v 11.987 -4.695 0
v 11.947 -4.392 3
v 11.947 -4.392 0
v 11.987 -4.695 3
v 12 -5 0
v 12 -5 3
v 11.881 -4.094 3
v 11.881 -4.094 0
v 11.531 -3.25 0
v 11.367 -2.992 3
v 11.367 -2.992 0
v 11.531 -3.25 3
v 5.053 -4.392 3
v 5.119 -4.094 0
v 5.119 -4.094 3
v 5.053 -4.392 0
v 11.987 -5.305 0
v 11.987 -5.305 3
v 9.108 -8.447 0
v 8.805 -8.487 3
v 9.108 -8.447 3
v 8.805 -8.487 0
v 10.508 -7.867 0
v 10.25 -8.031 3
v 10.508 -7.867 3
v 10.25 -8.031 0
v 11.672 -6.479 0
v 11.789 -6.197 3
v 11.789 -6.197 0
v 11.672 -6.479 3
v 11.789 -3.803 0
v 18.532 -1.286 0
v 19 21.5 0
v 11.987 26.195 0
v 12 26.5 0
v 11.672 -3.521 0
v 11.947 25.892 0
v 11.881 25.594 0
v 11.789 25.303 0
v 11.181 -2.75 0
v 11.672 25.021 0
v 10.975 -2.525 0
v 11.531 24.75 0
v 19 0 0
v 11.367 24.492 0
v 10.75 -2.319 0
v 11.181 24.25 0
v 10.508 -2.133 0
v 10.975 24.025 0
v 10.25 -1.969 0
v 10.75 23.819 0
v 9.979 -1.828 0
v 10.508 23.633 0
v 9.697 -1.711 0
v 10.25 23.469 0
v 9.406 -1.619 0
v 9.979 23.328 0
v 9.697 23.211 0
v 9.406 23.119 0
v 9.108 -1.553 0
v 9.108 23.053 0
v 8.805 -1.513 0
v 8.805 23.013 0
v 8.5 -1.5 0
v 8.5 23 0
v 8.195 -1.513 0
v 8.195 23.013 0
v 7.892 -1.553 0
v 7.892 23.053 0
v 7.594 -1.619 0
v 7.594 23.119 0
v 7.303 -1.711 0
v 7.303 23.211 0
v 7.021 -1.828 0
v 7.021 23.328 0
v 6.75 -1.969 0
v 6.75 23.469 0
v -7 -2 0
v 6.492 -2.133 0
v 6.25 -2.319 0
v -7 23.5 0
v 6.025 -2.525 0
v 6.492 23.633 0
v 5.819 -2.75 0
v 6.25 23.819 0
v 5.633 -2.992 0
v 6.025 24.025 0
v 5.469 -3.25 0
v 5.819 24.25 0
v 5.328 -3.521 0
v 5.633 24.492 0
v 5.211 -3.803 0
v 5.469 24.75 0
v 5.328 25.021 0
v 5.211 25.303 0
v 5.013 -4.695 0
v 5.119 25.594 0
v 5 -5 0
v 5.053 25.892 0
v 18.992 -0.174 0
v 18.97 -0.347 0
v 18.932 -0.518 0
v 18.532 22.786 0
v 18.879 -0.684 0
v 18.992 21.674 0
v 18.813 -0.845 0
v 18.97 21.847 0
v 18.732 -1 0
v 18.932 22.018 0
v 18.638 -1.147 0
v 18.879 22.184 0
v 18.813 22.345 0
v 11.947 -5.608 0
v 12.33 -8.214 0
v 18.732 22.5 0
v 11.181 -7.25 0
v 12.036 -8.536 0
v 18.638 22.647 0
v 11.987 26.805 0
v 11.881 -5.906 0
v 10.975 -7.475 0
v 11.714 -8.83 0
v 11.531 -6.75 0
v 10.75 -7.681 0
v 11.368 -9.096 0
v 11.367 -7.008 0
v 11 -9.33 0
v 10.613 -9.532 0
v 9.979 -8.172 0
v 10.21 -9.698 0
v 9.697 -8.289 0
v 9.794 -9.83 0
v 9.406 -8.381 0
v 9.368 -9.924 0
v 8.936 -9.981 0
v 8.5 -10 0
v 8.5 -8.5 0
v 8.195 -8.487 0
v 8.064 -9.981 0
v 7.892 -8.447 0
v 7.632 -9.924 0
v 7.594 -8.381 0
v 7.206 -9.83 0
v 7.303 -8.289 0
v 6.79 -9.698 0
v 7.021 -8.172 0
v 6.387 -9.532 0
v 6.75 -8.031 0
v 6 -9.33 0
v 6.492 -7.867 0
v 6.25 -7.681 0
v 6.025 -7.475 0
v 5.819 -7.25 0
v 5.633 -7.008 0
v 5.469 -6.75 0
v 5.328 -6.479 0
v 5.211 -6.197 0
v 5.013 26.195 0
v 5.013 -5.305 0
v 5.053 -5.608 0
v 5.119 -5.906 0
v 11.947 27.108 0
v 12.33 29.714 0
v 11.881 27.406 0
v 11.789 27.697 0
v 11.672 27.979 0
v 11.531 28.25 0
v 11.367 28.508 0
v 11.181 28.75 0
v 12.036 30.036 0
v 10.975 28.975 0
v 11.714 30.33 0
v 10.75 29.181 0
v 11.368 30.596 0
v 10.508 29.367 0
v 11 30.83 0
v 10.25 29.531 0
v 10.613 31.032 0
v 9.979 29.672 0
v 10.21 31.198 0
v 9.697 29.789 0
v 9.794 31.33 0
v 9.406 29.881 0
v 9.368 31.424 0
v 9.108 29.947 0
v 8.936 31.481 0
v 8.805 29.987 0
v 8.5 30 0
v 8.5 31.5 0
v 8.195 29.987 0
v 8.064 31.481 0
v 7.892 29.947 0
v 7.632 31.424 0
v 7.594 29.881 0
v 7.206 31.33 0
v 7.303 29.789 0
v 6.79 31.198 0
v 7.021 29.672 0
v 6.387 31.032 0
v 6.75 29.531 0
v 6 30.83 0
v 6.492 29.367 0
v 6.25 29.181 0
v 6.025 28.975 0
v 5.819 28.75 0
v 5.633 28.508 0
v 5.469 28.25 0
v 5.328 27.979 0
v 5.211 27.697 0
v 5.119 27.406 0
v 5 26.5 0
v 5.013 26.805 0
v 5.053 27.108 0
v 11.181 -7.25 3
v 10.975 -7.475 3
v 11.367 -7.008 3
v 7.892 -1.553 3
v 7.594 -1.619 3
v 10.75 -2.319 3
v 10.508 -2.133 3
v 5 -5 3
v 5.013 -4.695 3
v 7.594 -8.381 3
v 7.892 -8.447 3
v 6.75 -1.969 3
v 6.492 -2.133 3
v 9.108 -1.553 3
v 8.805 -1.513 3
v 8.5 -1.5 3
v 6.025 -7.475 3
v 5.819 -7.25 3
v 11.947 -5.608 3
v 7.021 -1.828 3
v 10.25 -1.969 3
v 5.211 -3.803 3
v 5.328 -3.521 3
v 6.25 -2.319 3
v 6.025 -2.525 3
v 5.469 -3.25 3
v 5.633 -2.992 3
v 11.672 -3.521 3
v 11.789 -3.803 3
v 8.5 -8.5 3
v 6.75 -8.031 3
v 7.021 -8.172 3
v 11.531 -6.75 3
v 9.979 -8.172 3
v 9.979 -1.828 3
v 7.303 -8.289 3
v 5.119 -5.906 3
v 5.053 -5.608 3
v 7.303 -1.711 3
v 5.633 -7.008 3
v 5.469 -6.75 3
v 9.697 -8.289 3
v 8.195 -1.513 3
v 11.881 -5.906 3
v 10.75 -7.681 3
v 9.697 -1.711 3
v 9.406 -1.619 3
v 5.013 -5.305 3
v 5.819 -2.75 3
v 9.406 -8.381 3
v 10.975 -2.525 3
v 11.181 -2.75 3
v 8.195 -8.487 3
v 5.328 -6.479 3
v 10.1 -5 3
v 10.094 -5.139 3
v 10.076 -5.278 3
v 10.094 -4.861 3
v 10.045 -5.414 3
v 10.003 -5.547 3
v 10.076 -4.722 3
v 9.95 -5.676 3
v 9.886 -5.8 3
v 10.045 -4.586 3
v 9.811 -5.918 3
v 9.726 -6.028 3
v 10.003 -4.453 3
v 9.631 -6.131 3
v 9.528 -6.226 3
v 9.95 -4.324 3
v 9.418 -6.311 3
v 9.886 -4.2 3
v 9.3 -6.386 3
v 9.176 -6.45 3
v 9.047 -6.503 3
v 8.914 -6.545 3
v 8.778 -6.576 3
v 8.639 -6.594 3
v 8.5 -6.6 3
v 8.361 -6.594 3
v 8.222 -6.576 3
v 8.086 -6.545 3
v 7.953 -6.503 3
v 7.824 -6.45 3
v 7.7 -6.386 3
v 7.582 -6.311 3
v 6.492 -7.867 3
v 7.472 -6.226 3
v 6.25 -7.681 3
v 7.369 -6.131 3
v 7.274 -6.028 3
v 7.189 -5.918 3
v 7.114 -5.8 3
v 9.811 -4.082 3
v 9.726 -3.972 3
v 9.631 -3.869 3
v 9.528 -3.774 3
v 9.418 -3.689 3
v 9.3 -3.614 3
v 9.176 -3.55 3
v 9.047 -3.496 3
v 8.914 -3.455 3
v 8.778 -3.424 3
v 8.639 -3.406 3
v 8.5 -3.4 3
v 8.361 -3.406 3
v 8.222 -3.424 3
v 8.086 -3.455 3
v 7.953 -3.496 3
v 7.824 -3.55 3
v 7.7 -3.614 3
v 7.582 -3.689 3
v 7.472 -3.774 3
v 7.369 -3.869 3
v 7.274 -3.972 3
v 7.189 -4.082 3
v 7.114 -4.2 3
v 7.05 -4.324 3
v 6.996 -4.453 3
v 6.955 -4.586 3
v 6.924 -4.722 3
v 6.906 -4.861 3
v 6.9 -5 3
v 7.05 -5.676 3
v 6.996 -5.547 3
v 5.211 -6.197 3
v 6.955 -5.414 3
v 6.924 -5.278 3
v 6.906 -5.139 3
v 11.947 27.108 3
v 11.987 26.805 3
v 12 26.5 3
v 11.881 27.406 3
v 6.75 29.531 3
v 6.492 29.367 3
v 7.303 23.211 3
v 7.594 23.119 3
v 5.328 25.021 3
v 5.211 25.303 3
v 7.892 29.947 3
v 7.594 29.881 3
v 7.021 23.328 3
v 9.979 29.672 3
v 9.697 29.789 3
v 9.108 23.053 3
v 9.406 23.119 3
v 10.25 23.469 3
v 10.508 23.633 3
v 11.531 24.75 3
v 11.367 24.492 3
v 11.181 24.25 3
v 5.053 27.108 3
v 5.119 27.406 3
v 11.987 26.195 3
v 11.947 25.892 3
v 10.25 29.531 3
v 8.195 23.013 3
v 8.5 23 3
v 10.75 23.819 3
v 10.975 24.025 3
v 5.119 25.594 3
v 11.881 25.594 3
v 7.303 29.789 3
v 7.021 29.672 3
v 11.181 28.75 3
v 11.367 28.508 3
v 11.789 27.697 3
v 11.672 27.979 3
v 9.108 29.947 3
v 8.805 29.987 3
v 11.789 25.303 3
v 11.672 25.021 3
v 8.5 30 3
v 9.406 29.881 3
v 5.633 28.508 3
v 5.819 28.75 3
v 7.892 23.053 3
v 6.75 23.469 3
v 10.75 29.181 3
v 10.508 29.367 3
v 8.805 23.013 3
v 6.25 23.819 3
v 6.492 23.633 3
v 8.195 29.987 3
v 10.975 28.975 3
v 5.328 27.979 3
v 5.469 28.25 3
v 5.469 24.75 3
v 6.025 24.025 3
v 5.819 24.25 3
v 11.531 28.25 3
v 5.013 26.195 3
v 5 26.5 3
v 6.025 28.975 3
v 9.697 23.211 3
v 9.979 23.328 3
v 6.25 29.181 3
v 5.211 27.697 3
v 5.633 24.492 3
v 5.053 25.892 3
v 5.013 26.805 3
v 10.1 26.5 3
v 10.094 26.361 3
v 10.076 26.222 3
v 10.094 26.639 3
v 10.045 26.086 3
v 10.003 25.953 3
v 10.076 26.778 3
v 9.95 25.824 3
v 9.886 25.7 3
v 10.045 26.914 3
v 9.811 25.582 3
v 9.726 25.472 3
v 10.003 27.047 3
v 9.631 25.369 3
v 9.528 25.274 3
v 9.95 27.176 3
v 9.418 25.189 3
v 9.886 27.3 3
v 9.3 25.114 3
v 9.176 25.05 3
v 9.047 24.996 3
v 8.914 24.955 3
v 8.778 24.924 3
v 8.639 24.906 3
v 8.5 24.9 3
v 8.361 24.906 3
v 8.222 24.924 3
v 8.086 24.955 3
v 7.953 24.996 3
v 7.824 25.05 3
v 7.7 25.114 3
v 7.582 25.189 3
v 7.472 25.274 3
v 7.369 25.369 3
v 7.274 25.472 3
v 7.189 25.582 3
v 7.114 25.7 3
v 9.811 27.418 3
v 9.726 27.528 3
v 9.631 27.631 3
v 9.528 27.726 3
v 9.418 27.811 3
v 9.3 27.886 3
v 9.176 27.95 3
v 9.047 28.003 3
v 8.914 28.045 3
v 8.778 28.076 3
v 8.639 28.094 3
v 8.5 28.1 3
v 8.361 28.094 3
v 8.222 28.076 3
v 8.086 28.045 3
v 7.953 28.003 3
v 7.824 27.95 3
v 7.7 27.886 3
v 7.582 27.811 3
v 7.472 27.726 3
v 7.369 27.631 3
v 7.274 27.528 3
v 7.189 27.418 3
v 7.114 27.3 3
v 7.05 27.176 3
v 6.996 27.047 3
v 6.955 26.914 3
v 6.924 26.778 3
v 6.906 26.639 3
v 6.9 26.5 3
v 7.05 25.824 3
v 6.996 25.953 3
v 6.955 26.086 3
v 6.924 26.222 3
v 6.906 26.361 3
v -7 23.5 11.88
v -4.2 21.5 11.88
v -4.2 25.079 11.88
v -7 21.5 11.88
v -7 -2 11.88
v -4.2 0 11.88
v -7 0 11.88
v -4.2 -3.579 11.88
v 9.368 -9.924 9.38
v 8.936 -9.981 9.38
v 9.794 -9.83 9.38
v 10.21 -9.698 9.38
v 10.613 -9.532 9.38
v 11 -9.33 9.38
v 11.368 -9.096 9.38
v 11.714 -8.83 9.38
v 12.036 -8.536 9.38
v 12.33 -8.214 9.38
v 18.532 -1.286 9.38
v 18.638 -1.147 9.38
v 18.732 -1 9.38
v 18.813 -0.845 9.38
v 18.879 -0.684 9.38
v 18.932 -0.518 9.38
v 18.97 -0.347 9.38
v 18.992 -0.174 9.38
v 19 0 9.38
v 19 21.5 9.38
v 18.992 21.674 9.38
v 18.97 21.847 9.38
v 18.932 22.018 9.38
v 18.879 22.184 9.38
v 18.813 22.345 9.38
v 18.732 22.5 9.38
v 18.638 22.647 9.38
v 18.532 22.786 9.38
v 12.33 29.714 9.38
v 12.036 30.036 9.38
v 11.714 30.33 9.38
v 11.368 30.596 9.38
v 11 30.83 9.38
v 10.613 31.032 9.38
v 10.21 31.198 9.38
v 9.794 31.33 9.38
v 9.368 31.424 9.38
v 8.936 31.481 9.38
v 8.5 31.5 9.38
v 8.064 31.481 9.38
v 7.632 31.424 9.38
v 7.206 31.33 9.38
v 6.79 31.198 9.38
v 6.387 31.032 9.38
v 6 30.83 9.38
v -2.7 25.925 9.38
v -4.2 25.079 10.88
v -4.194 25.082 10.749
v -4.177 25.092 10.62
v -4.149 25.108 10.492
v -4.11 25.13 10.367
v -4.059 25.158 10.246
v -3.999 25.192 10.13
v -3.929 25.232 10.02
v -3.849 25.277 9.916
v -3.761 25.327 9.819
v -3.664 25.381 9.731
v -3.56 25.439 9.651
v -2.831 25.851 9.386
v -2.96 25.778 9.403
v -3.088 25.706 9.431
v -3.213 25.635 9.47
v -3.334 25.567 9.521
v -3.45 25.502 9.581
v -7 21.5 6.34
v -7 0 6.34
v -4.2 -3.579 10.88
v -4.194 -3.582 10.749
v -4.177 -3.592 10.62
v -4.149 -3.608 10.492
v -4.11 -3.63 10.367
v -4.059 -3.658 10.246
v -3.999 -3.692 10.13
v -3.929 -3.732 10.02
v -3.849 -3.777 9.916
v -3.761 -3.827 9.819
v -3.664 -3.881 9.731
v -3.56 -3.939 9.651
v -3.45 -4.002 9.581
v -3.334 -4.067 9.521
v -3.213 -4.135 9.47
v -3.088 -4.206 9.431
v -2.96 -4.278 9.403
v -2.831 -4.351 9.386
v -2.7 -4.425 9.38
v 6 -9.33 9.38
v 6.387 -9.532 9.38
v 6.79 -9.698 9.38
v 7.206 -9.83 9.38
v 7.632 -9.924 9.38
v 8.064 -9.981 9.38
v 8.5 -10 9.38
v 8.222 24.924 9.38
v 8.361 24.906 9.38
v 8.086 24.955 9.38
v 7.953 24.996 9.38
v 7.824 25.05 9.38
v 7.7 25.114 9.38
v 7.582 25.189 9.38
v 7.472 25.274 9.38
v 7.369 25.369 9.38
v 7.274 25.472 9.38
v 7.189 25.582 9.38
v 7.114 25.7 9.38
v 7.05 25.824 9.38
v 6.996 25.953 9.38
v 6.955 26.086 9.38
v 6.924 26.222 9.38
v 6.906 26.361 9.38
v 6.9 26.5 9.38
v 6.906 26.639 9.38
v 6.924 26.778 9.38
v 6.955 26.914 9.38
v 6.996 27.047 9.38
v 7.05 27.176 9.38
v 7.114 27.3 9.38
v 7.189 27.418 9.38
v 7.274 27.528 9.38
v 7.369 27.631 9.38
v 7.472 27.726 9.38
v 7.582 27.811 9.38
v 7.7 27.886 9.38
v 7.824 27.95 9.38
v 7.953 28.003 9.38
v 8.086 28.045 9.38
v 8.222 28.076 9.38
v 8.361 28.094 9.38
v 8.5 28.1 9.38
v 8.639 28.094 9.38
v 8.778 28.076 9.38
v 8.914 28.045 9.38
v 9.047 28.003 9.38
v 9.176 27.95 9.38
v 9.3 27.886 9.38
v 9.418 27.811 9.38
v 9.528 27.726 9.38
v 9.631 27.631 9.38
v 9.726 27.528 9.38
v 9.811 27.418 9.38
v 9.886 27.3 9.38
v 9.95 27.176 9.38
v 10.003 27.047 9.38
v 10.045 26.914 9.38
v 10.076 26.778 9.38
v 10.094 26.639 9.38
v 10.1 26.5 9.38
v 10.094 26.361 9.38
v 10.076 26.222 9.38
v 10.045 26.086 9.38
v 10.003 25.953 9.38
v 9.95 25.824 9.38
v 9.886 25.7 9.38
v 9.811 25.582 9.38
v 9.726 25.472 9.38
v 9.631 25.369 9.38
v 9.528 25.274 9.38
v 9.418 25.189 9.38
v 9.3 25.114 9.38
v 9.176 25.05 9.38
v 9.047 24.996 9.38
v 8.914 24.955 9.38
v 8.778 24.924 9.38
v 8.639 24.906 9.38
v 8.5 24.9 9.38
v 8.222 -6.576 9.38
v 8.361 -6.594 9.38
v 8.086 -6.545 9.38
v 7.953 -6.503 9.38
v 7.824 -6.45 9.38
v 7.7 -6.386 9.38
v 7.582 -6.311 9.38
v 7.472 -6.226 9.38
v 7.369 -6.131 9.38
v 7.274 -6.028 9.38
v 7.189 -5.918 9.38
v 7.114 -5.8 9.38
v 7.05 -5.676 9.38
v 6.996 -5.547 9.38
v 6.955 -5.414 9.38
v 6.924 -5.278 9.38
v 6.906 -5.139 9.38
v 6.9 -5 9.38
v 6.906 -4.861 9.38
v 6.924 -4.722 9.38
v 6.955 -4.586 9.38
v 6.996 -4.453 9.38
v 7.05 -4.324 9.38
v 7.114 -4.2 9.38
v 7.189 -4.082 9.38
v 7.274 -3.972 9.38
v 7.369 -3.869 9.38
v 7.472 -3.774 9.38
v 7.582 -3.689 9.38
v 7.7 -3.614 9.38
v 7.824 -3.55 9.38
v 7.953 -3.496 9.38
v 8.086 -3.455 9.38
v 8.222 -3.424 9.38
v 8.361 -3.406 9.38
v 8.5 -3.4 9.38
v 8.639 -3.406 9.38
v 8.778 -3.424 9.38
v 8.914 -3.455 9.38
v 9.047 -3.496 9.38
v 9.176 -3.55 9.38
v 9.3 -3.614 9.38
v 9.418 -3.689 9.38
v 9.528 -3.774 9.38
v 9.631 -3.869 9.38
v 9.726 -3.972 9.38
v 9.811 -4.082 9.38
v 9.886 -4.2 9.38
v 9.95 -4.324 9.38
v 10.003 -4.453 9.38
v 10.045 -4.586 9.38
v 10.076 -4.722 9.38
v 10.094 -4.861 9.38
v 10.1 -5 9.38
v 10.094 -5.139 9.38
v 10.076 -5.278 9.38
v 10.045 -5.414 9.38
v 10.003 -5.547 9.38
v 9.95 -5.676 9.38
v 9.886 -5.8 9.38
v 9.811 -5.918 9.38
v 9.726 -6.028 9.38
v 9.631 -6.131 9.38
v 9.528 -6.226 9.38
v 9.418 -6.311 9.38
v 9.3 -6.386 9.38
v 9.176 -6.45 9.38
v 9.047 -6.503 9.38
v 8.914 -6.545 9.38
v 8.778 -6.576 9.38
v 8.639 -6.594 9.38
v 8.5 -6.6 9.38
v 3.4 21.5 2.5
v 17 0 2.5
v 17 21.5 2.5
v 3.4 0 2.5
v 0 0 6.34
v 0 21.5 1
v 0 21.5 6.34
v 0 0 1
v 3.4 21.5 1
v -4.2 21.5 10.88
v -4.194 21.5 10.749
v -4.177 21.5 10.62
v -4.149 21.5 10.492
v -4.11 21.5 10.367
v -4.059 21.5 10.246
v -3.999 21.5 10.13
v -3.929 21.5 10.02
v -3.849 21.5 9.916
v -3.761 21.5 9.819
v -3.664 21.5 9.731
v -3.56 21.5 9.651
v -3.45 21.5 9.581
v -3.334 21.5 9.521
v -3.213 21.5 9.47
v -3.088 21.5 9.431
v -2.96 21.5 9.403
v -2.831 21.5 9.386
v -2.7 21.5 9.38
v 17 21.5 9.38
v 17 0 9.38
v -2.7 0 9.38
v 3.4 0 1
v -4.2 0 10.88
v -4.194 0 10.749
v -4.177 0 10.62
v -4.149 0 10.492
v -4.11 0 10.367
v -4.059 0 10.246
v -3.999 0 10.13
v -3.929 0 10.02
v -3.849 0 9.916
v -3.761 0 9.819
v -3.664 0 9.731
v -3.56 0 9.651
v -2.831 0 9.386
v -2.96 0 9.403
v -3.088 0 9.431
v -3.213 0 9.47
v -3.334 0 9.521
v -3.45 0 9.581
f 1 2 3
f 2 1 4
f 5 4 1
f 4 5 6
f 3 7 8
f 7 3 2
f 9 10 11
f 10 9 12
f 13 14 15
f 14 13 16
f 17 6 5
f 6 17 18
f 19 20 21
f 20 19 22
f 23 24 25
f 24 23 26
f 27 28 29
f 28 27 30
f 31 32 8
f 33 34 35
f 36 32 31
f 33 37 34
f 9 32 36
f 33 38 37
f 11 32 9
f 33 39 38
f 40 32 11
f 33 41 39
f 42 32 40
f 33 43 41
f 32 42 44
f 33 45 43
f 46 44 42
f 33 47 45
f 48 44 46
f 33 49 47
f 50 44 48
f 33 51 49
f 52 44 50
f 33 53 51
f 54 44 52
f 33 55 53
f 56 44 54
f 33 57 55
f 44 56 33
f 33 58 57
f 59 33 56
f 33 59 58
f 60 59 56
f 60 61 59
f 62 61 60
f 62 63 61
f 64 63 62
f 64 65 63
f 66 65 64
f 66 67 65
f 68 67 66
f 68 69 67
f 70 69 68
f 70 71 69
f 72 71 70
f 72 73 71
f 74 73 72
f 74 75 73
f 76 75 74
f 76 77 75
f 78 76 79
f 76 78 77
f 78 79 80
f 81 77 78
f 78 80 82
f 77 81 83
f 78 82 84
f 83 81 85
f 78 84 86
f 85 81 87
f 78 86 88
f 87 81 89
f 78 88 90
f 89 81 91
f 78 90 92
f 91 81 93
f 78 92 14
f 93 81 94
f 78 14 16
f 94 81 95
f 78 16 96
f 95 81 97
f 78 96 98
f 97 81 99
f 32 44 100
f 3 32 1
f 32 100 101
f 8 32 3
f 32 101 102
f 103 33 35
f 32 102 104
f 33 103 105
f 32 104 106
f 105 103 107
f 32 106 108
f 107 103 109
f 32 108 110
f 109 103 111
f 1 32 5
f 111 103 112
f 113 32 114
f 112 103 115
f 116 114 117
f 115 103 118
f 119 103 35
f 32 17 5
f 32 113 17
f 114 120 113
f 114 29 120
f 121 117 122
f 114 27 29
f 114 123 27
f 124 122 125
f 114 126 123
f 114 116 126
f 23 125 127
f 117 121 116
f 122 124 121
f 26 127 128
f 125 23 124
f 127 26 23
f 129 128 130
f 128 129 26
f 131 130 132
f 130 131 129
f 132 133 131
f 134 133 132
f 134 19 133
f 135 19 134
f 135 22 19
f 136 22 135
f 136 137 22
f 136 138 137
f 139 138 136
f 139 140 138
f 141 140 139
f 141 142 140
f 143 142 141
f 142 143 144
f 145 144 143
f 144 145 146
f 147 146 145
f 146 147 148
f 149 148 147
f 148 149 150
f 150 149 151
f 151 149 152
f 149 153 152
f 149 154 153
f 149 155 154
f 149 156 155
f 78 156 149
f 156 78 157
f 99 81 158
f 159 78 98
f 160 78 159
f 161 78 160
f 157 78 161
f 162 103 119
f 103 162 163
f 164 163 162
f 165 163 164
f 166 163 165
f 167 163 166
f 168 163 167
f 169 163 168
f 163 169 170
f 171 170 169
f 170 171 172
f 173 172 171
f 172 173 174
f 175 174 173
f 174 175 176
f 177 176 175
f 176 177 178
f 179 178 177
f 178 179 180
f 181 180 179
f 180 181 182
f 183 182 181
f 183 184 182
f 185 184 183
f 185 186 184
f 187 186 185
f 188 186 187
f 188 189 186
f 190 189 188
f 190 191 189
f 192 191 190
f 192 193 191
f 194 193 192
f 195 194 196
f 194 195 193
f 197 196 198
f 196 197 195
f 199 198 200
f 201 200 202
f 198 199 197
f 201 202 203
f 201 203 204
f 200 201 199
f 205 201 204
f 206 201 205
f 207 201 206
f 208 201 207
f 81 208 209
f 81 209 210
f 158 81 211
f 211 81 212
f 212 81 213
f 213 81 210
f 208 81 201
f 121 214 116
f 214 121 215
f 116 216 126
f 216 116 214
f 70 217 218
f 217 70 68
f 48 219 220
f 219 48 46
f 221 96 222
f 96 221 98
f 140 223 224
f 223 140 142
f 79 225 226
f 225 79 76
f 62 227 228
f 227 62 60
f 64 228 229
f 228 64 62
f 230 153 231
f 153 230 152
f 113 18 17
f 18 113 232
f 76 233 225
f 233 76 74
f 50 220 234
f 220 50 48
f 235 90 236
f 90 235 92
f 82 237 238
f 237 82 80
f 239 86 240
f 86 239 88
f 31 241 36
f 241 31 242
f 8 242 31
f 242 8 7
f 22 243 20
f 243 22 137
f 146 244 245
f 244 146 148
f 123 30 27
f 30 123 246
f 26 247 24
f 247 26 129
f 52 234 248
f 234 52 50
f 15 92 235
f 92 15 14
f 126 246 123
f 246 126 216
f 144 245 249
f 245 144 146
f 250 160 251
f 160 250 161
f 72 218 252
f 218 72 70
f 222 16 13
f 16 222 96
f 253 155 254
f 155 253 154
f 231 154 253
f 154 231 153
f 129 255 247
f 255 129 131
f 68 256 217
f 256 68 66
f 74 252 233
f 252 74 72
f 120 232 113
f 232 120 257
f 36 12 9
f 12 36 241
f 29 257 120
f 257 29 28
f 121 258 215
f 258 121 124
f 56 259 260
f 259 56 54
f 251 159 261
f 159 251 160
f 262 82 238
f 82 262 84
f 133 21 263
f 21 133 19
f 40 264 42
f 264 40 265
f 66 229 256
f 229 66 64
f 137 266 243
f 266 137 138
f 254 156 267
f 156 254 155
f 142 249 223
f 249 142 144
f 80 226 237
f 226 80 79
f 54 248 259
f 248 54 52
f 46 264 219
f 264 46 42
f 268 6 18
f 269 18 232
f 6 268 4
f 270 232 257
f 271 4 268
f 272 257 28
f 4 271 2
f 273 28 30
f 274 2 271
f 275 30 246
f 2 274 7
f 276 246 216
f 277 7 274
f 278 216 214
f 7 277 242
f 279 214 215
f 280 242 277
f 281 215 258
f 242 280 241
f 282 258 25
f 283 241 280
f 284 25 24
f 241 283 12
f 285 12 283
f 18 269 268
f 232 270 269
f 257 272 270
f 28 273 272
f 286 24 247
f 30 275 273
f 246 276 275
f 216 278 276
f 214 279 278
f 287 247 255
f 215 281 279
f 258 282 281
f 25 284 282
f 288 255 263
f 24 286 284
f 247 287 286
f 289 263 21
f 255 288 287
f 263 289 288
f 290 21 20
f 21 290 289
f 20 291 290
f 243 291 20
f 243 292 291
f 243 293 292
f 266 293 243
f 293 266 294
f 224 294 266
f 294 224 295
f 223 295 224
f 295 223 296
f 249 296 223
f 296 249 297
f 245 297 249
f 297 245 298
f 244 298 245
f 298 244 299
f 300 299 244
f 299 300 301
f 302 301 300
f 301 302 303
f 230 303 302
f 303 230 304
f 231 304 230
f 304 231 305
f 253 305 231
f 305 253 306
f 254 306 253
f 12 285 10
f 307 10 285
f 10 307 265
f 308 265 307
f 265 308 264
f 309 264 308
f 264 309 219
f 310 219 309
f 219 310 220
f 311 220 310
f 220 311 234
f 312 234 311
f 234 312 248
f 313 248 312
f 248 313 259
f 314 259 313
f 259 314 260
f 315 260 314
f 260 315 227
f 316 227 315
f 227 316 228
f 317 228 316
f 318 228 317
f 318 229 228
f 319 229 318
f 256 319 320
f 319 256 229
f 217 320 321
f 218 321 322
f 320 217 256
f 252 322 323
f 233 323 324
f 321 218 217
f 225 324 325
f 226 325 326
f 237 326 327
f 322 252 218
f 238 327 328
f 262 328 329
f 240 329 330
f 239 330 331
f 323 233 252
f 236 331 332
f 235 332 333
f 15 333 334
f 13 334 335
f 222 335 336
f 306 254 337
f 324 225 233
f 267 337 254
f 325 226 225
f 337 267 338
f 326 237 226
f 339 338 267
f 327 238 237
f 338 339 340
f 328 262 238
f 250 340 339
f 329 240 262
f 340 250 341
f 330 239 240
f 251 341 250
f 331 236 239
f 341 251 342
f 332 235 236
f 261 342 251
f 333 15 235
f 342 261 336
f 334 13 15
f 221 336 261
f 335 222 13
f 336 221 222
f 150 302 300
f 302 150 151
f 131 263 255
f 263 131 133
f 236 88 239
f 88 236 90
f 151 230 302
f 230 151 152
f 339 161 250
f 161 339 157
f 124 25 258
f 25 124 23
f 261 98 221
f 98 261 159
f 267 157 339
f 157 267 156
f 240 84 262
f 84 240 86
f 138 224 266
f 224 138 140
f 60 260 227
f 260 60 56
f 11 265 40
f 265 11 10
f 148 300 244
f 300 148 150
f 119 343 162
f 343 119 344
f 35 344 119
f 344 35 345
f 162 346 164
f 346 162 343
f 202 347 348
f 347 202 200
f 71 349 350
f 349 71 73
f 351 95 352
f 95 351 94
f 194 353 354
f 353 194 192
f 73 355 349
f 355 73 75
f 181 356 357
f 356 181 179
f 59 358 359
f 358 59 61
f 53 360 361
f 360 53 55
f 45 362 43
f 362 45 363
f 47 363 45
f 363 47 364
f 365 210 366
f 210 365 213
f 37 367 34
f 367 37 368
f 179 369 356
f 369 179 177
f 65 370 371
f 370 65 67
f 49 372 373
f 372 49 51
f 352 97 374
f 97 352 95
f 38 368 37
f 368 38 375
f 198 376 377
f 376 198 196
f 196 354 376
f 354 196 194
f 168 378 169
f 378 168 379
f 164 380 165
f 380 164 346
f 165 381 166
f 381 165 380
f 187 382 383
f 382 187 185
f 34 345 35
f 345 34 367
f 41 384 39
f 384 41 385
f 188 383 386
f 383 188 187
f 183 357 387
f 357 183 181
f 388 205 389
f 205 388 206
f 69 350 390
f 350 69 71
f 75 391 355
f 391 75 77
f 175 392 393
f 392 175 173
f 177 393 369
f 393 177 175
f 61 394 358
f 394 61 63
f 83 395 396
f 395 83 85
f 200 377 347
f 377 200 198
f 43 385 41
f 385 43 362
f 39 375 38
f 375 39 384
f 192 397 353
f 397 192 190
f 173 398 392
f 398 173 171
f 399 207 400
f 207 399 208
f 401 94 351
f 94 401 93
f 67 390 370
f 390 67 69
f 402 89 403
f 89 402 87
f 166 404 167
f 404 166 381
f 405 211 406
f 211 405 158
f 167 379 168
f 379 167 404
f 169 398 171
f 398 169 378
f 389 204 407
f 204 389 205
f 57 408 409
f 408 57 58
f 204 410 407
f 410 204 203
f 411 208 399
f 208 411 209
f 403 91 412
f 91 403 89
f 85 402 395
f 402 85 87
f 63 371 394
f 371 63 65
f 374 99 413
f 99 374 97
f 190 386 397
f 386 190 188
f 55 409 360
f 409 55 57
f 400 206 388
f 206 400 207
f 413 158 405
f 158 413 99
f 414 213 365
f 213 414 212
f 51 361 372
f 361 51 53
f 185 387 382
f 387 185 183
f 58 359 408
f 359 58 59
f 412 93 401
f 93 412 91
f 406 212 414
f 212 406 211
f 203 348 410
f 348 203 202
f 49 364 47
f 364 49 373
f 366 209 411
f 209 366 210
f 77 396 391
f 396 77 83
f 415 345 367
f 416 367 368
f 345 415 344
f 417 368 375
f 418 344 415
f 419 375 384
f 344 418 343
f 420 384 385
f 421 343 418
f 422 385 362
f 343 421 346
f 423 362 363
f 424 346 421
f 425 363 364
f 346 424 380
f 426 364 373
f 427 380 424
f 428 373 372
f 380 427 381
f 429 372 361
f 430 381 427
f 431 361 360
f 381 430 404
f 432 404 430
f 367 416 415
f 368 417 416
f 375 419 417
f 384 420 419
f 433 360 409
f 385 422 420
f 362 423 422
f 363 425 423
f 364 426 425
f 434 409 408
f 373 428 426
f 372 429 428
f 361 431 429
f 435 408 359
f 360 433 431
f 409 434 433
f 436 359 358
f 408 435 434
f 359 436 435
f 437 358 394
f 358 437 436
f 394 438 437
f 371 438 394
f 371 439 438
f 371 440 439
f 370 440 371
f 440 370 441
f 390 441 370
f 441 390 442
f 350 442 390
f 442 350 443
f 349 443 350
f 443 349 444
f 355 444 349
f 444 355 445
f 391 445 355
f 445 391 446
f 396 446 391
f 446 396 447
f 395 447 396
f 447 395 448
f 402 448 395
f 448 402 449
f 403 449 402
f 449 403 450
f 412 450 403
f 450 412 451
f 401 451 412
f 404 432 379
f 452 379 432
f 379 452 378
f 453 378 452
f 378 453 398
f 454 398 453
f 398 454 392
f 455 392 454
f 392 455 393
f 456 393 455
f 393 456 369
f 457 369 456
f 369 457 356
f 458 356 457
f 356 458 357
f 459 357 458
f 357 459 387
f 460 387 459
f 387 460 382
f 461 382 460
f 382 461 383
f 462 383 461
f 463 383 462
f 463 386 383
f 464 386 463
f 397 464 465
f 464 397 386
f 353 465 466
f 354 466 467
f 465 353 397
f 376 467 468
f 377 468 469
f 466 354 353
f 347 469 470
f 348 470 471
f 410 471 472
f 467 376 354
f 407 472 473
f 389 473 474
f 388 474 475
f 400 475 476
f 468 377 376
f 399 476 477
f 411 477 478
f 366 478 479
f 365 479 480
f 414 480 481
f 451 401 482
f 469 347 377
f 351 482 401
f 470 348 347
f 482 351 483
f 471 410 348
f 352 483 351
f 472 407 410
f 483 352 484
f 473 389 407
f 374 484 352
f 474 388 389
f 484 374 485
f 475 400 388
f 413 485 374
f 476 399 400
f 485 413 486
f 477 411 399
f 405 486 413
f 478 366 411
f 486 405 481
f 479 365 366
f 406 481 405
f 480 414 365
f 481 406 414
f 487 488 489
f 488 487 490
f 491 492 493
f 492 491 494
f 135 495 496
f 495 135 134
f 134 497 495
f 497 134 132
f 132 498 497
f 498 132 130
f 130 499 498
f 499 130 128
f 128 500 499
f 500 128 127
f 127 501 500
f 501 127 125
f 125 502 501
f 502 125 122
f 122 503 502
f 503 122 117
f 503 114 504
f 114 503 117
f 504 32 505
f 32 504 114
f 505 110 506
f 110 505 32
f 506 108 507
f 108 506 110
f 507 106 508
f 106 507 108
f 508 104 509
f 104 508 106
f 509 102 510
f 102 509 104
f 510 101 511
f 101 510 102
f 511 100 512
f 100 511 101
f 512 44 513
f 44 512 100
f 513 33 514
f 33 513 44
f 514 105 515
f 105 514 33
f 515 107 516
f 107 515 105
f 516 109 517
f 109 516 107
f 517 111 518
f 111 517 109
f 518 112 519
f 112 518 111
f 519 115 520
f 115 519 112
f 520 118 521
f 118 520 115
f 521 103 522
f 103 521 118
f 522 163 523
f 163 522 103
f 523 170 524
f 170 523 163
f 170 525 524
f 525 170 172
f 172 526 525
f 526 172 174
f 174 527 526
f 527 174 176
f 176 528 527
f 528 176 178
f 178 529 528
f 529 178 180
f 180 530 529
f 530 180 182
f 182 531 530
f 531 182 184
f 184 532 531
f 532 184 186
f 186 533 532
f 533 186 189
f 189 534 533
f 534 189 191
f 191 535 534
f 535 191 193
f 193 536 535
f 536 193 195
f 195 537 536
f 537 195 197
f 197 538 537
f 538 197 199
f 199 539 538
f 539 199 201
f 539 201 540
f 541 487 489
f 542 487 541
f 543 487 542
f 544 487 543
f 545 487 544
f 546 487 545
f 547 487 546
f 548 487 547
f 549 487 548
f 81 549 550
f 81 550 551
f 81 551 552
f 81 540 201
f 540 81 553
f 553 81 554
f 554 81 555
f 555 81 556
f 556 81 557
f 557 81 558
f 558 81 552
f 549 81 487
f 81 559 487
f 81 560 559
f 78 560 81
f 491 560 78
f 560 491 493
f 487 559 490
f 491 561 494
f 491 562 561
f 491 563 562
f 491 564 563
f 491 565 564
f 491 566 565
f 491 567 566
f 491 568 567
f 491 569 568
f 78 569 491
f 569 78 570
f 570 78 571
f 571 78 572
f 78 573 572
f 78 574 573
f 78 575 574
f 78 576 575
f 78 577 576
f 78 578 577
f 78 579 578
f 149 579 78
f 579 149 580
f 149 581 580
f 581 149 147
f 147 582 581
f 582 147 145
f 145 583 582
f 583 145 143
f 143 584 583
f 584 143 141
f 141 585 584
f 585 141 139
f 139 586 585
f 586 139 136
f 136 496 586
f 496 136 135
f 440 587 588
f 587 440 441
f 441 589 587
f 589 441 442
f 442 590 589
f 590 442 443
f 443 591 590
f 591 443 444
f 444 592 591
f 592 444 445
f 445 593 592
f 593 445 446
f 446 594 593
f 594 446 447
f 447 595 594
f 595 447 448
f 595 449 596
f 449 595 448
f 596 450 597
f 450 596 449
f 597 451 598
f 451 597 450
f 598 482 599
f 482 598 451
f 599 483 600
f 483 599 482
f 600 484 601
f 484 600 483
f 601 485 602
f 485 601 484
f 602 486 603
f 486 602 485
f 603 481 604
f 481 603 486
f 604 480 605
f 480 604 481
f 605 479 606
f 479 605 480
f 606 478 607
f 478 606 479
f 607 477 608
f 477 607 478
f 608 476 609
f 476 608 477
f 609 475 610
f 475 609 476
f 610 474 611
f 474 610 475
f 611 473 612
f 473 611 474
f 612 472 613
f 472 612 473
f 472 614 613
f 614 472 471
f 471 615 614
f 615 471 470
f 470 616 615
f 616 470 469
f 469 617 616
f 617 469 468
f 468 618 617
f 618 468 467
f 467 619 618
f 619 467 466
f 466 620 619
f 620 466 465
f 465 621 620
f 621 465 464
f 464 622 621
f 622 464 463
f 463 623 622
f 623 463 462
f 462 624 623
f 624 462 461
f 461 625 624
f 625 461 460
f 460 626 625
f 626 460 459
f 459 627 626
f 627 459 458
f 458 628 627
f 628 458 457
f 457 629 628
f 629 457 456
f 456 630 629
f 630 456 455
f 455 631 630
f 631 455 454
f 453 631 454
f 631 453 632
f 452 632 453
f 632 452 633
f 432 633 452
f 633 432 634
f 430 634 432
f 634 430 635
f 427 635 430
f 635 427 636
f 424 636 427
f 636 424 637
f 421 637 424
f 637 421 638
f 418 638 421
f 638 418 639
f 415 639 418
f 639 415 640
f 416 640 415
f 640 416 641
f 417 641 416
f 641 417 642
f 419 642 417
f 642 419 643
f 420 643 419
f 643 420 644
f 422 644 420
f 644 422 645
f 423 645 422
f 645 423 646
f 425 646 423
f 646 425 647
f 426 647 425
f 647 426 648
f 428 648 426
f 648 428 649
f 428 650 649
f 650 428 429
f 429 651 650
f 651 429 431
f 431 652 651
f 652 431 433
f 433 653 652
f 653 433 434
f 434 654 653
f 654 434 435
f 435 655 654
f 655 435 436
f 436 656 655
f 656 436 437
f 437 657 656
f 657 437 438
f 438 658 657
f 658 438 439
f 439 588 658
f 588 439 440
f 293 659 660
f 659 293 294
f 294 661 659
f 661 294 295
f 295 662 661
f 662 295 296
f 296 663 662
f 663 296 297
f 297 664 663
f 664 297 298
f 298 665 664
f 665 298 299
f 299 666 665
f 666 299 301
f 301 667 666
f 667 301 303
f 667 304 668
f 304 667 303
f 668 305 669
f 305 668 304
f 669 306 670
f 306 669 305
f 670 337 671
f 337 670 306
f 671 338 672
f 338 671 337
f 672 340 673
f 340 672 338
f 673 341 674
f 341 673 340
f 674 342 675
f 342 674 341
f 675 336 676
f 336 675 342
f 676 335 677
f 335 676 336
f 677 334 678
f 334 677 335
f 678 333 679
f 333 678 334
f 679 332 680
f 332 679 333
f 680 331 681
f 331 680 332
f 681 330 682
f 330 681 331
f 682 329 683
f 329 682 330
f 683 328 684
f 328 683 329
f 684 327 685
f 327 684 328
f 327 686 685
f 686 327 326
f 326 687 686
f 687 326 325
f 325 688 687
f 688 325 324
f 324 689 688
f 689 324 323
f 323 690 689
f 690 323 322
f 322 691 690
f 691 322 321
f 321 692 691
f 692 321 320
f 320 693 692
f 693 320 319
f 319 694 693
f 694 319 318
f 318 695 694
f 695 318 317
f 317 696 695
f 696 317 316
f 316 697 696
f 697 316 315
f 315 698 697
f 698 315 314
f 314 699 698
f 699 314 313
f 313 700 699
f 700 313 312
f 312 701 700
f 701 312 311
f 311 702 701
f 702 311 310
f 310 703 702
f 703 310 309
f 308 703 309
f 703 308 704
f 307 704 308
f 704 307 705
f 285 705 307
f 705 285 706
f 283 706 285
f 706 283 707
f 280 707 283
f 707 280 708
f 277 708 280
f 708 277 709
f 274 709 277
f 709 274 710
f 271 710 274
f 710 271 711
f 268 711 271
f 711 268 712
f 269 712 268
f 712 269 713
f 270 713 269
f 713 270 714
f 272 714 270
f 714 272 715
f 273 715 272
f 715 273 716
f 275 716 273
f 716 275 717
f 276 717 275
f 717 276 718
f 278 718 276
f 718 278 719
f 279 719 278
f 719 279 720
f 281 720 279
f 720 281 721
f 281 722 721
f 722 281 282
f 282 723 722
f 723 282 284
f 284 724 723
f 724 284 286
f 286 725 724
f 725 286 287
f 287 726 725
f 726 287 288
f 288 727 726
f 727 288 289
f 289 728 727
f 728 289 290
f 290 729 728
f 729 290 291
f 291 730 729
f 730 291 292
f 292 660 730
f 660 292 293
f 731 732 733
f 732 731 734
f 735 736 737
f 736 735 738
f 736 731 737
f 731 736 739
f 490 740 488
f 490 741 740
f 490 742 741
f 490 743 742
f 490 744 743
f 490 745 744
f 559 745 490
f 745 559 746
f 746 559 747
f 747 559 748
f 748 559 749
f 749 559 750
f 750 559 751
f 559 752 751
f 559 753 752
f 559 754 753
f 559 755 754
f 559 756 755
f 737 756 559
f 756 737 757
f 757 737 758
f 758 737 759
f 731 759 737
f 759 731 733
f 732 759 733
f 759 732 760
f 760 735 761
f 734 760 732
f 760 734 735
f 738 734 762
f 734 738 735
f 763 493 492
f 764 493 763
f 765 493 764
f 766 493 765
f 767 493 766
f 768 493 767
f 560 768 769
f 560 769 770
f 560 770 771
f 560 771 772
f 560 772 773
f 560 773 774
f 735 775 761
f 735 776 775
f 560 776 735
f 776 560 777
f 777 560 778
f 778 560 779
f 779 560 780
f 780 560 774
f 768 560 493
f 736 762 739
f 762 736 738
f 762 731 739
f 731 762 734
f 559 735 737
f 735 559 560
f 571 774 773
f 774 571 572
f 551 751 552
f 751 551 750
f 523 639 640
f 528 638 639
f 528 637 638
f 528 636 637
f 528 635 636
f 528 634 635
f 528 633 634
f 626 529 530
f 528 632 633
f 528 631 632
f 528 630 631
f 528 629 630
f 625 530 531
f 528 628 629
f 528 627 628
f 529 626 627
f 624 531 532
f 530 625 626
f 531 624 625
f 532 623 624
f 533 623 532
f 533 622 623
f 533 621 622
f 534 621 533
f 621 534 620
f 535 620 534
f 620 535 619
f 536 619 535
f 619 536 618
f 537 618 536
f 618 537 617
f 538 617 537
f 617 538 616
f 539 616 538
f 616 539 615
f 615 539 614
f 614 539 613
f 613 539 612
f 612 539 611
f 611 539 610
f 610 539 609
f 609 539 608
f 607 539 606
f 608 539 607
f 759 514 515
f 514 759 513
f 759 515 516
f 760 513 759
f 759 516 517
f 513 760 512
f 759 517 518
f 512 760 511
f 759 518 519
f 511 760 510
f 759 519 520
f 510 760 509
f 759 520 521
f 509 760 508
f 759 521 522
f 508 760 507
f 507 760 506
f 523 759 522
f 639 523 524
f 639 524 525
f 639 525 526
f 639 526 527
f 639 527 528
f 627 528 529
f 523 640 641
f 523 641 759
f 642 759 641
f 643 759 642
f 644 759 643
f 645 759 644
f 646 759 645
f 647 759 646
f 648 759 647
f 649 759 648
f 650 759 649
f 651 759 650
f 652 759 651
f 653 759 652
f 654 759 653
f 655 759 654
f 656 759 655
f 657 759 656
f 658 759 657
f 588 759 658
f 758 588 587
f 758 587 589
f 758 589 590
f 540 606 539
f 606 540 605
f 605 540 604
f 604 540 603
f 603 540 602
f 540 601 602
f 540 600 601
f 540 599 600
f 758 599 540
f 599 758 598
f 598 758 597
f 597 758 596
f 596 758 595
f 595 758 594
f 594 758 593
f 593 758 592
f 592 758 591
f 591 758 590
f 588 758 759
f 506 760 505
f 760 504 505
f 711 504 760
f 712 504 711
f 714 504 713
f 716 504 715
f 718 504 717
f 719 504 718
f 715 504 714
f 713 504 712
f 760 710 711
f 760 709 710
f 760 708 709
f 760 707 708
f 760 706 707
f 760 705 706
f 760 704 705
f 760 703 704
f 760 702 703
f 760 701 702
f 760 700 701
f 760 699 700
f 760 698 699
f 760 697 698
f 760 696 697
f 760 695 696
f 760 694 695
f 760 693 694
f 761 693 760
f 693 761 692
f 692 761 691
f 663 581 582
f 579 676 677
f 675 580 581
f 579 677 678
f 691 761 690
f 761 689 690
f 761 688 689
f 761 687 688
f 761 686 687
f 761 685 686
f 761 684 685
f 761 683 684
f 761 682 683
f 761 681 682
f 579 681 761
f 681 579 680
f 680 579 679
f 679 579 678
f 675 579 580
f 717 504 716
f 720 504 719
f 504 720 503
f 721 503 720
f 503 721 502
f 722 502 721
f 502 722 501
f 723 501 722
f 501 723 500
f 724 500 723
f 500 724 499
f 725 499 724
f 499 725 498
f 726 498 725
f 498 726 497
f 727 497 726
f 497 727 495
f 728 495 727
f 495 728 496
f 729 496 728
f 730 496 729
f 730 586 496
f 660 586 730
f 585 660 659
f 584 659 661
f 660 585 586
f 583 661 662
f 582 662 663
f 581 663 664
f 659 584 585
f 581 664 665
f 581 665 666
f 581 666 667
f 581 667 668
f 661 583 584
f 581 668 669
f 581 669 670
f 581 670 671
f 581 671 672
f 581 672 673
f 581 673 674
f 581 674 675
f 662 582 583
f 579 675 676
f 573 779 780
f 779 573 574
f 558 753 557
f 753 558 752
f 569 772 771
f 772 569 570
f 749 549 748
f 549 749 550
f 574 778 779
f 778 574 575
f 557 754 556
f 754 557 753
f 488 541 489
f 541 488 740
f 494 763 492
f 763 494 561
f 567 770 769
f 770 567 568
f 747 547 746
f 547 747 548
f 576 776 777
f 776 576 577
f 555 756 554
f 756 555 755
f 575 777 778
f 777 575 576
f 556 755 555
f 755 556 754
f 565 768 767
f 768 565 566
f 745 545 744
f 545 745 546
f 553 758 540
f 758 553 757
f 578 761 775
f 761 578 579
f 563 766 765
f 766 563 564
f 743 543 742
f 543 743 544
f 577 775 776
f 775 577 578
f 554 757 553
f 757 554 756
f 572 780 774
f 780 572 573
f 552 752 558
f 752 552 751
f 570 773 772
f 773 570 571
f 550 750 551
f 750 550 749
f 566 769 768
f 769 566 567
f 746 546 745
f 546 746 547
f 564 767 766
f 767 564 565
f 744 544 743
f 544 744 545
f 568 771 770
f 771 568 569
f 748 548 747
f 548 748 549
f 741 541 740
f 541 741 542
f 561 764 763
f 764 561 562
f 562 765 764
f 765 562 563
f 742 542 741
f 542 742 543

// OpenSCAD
/*
MPU-6050 / 9150 IMU mounting bracket.

M3 mounting screws go beside the board

Holds a female 0.1" pin header in place.


Board dimensions:
20.9mm long
15.9mm wide
1.5mm thick
15.3mm hole to hole
3.05mm hole dia

L pins: 
2.6mm wide
2.5mm high
9mm long
*/

$fs=0.1; $fa=5;
inch=25.4;
wiggle=0.25; // printed clearance around printed parts, so parts actually fit
pinspacing=0.1*inch;
wall=2.0;
floor=2.5;
board_thick=1.3+0.1*inch; // board and first layer of headers
solder_thick=1.5;
pin_thick=0.1*inch+0.5;
overall=floor+pin_thick+board_thick+floor;

board_height=21.5;
board_width=17;

tube_OD=25.4;
module tube2D() {
    round=1.5;
    offset(r=+round) offset(r=-round)
        square([tube_OD,tube_OD]);
}
module tube3D() {
    translate([board_width/2-tube_OD/2,100,floor+pin_thick+board_thick])
        rotate([90,0,0])
            linear_extrude(height=200) tube2D();
}
//#tube3D();


module mpu_board2D() {
    square([board_width,board_height]);
}

module mpu_pins2D() {
    translate([4,0])
        scale([-1,1])
            square([11,board_height]);
}

module mpu_holes2D() {
    hole=5;
    for (y=[-hole,board_height+hole])
        translate([board_width/2,y])
            children();
}

module mpu_case2D() {
    difference() {
        hull() {
            offset(r=wall) mpu_board2D();
            for (dy=[-wall,+wall]) translate([0,dy])mpu_pins2D();
            mpu_holes2D() circle(d=6+2*wall);
        }
        mpu_holes2D() circle(d=3.2);
    }
}

module mpu_case3D() {
    difference() {
        // Outside shape
        linear_extrude(height=overall,convexity=4) mpu_case2D();

        // Space to silicone in the board
        translate([0,0,floor])
            linear_extrude(height=overall) mpu_board2D();
        
        // Extra space for solder on board
        scale([0.2,1]) translate([0,0,floor-solder_thick])
            linear_extrude(height=overall) mpu_board2D();
        
        // Space for the pins
        translate([0,0,floor+board_thick])
            linear_extrude(height=overall) mpu_pins2D();
        
        // Space for M3 bolt heads
        mpu_holes2D() cylinder(d=7,h=3);
        
        // Clearance for the frame tube
        tube3D();
    }
}

mpu_case3D();
